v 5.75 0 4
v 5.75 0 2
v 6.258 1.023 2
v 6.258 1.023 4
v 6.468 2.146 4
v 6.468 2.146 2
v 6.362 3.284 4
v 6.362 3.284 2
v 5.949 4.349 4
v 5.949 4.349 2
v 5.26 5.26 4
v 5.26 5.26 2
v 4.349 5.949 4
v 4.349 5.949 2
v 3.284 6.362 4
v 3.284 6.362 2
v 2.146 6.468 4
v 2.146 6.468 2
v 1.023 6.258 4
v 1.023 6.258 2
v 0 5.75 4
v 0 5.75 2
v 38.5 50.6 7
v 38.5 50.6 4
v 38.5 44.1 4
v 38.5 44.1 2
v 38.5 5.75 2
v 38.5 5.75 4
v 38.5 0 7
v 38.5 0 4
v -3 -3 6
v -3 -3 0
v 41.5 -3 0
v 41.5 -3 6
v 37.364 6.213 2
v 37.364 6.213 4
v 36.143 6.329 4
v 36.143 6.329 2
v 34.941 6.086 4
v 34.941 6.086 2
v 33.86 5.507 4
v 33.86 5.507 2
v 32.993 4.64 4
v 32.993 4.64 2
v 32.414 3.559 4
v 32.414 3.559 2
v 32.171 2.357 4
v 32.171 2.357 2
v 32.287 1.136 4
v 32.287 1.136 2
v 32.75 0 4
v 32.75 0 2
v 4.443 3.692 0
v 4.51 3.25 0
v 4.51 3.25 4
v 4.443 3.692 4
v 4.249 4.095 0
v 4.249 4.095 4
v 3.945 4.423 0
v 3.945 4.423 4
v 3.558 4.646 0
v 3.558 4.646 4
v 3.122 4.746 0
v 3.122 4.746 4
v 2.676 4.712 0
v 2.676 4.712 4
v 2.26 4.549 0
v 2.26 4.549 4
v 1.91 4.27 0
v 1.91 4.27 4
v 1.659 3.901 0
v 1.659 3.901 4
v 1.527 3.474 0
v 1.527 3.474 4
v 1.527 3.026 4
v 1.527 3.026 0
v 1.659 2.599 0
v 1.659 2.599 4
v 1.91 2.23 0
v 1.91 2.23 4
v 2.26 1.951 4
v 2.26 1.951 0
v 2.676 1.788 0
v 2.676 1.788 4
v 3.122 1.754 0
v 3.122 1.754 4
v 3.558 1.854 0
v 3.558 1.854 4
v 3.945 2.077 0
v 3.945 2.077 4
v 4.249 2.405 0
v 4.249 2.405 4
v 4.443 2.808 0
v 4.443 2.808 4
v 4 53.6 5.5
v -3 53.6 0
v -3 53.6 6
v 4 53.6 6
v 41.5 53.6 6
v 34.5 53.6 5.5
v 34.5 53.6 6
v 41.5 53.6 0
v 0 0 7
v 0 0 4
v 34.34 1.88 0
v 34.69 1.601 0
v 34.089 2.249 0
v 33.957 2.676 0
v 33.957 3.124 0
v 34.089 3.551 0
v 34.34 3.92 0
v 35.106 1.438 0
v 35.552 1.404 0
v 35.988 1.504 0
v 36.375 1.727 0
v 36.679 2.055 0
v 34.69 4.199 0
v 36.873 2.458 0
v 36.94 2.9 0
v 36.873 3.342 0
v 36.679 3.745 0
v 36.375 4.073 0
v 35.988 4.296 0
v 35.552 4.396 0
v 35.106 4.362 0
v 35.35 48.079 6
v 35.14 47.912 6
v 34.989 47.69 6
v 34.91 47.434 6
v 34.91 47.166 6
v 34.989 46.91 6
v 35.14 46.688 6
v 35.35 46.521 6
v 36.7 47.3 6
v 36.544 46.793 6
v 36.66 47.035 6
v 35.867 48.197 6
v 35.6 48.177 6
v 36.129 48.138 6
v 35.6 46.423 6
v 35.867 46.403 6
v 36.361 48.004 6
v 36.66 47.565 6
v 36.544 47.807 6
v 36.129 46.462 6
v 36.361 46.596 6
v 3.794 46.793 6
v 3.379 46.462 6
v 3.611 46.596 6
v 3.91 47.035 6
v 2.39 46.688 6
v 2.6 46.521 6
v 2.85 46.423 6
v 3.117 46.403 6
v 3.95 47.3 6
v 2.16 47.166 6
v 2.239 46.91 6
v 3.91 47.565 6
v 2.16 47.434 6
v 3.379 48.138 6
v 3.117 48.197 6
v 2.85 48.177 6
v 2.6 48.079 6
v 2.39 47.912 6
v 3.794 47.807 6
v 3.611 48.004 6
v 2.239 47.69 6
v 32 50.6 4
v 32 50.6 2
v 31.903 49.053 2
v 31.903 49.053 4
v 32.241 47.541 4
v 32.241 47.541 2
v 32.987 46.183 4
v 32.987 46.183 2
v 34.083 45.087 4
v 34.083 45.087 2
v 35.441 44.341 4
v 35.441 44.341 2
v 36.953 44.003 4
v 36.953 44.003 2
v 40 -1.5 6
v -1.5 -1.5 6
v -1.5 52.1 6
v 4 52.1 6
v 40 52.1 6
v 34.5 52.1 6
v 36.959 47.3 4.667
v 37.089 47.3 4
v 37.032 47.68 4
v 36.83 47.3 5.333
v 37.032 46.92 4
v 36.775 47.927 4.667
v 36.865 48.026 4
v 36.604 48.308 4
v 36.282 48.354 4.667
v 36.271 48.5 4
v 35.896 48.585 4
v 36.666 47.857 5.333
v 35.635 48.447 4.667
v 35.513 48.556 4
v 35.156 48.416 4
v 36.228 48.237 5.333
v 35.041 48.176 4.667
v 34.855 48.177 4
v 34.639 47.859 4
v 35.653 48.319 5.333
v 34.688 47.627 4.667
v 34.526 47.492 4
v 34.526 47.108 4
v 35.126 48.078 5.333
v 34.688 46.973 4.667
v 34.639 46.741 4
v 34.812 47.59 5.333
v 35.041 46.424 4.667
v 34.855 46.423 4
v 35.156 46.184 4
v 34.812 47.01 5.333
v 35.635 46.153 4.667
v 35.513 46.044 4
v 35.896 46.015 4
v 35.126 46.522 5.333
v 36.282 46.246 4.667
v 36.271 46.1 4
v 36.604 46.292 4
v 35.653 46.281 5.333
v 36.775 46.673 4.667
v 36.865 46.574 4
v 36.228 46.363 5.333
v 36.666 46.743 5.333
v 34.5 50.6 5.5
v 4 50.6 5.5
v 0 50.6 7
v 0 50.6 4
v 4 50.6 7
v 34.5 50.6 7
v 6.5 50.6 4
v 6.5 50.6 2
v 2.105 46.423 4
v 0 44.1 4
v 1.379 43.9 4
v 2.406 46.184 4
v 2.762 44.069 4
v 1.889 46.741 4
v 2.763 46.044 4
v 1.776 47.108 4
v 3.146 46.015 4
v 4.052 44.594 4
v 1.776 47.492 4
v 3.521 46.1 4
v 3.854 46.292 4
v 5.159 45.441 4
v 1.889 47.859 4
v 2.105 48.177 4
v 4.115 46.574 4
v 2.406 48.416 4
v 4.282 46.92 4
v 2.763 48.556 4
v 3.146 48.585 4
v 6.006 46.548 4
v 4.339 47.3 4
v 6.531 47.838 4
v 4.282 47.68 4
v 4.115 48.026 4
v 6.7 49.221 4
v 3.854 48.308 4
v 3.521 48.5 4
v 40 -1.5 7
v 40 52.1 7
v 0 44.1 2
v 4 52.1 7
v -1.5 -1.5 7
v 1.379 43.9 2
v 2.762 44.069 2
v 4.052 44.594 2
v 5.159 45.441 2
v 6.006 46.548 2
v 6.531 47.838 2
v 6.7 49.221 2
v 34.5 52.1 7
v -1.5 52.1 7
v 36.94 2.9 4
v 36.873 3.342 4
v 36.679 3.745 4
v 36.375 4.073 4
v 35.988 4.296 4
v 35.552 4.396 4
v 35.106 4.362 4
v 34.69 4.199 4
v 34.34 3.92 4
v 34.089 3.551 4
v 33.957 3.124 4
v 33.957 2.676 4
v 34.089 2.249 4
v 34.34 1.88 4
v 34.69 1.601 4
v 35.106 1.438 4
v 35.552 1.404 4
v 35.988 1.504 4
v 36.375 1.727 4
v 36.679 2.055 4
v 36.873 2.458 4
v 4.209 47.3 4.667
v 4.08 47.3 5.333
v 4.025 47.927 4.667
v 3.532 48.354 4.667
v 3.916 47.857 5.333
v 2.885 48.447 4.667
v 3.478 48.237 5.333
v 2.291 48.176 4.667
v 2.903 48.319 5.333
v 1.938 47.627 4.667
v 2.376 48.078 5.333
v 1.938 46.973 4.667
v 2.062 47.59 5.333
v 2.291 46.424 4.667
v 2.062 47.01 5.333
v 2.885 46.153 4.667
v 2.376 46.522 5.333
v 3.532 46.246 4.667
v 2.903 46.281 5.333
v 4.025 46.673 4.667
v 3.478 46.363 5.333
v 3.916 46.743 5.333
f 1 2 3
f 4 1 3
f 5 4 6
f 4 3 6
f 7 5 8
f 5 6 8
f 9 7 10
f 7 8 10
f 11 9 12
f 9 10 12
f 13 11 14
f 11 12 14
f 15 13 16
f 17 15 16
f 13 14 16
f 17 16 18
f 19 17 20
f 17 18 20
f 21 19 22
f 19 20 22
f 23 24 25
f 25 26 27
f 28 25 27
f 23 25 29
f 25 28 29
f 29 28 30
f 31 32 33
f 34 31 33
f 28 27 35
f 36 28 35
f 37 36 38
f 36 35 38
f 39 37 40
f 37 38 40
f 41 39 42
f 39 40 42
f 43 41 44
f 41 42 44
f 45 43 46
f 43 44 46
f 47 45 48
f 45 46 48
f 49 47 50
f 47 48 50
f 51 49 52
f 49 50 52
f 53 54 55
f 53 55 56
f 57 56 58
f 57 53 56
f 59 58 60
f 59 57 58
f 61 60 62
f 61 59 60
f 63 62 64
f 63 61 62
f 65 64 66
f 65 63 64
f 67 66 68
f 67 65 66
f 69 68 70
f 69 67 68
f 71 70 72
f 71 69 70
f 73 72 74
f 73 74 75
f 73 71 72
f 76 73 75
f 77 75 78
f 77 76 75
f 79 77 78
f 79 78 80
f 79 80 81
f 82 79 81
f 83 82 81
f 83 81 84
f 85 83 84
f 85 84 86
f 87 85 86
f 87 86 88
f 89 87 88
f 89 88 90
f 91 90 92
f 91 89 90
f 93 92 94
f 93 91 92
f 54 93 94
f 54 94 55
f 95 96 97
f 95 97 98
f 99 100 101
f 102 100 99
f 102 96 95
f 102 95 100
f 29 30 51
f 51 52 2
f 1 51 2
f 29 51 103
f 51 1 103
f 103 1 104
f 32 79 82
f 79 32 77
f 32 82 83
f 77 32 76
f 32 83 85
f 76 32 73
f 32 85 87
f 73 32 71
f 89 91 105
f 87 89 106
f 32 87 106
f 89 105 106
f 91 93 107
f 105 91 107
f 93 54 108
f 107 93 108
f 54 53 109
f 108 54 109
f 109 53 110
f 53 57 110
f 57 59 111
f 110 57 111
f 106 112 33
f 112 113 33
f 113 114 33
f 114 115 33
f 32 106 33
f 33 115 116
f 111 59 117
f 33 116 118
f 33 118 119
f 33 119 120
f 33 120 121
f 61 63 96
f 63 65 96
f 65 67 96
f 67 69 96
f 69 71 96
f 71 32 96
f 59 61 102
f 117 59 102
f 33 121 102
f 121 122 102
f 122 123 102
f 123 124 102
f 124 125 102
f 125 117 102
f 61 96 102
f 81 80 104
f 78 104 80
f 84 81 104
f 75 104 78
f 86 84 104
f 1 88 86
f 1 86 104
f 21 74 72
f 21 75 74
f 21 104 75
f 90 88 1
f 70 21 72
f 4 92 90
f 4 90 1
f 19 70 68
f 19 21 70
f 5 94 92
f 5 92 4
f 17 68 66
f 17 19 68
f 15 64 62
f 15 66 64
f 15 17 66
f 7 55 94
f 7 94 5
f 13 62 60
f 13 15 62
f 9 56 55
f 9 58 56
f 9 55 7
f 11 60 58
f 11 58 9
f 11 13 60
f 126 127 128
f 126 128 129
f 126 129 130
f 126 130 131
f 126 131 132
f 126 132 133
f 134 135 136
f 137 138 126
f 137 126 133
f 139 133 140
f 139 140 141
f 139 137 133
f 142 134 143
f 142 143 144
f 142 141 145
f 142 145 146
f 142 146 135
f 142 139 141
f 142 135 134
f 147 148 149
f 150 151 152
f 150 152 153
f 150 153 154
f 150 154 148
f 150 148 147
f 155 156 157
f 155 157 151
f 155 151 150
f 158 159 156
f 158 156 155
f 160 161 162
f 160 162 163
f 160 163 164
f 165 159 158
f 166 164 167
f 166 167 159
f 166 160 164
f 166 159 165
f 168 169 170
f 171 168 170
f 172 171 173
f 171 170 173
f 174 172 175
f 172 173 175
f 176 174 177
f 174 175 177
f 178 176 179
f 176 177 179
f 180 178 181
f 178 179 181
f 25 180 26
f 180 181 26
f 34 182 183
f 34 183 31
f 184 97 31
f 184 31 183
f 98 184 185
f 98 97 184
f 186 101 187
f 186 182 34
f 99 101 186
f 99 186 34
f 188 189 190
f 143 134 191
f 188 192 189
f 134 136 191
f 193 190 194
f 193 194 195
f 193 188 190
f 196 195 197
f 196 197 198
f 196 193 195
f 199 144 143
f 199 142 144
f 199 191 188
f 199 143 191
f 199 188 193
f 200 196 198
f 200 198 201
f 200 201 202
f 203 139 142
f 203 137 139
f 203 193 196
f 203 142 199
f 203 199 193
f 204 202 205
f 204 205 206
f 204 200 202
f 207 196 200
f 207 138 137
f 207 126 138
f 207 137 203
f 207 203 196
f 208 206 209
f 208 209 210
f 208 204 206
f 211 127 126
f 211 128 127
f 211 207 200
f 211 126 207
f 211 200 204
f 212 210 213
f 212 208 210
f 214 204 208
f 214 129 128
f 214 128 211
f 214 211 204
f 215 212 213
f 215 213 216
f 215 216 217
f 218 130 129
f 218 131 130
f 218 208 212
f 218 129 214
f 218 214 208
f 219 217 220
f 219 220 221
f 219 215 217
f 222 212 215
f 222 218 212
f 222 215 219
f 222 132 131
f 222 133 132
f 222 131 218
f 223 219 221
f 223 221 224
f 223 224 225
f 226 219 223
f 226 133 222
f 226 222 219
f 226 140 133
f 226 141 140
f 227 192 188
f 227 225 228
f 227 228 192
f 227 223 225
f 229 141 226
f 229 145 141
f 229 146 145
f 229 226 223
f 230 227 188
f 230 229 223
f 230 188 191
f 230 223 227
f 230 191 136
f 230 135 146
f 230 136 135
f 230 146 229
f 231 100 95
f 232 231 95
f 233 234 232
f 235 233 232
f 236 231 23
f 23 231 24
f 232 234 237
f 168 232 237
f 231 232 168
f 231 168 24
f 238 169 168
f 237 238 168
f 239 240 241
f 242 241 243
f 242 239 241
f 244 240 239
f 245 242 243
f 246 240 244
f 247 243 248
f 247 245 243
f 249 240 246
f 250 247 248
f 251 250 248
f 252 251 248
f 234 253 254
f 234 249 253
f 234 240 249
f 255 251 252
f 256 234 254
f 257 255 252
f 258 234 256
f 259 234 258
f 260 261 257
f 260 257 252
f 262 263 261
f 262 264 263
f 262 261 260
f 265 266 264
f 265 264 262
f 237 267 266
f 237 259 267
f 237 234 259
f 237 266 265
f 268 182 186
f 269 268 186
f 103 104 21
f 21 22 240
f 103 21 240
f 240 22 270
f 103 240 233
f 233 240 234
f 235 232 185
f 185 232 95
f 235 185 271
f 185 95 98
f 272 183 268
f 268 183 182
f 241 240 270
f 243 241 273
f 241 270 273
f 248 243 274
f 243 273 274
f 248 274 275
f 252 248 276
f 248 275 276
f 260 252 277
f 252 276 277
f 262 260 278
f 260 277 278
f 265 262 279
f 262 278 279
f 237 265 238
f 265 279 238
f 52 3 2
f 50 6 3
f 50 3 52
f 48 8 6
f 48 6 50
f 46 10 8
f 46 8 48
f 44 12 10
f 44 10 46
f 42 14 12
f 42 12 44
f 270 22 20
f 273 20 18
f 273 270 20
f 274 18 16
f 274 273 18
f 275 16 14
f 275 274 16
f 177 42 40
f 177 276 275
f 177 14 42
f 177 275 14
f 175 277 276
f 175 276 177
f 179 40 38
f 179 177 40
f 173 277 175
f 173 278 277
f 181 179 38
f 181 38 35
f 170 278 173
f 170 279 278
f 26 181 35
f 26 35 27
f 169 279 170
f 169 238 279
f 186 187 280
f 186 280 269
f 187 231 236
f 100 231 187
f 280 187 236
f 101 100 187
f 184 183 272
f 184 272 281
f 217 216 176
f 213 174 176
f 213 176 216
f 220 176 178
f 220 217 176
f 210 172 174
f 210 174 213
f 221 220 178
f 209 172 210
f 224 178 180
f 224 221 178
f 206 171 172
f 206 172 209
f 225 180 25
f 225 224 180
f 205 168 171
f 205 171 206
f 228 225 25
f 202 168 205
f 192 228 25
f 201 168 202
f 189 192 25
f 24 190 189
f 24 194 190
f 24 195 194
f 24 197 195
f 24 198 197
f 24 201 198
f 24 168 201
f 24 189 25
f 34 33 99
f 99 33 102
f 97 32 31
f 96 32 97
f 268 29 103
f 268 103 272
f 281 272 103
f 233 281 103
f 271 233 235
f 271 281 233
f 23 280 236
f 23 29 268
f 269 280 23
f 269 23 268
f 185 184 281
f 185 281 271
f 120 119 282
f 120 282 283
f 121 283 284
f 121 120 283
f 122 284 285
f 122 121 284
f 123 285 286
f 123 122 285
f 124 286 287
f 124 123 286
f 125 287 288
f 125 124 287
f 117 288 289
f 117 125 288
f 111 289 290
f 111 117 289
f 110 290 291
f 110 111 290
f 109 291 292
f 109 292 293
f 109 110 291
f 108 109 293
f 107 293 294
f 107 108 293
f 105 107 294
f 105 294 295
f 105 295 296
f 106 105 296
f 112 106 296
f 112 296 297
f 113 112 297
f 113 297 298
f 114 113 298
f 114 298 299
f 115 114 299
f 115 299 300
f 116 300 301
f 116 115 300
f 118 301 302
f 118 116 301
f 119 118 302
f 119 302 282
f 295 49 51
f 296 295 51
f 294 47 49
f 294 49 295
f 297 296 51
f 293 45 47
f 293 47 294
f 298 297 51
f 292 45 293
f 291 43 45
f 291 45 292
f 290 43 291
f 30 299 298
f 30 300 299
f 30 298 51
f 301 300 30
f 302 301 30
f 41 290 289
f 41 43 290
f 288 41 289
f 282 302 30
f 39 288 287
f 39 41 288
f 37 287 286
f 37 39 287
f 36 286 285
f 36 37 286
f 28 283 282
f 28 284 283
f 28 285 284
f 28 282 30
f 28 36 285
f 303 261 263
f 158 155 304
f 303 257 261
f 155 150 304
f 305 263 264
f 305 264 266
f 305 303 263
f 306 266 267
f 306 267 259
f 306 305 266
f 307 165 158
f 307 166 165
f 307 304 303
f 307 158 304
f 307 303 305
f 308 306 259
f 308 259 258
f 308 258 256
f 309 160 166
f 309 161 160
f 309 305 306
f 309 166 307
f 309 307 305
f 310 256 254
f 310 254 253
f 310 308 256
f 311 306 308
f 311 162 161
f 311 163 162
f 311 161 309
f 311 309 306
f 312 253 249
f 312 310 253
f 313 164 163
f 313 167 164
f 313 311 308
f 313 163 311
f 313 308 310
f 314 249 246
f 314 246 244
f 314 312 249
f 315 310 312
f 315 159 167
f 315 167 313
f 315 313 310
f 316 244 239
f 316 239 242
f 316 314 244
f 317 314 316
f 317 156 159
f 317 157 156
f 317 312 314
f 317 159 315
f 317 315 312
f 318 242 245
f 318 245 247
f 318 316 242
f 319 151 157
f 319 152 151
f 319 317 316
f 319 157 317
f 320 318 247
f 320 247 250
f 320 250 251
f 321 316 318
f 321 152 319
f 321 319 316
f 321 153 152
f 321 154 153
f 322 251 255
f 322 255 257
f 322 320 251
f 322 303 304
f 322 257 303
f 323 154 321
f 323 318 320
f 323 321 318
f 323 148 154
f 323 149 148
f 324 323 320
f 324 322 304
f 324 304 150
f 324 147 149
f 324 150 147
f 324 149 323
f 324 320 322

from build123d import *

# Parameters (mm, degrees)
F1_DEPTH = 2
F0_R     = 1.3
F0_R_2   = 1.5
F2_DEPTH = 4
F3_DEPTH = 6
F0_W     = 41.5
F0_H     = 53.6
F4_DEPTH = 7
F0_W_2   = 44.5
F0_H_2   = 56.6
F5_DEPTH = 6
F6_W     = 30.5
F6_H     = 1.5
F7_DEPTH = 3


# Not quite as in the source:
# - a fillet or chamfer that OpenCascade refuses, or shapes differently, is made with other operations: its cross-section is extruded or revolved along the edge and cut away or added
# - a feature names something its author has since deleted; it is built from what else it names


with BuildPart() as f1:
    # F0 (on Top) → F1 (new body)
    with BuildSketch(Plane.XY):
        with BuildLine():
            ThreePointArc((0, 5.75), (5.2603266711, 5.2603266711), (5.75, 0))
            Line((5.75, 0), (32.75, 0))
            ThreePointArc((32.75, 0), (33.3948928082, 5.1051071918), (38.5, 5.75))
            Line((38.5, 5.75), (38.5, 44.1))
            ThreePointArc((38.5, 44.1), (33.4963752154, 45.5963752154), (32, 50.6))
            Line((32, 50.6), (6.5, 50.6))
            ThreePointArc((6.5, 50.6), (5.1593928501, 45.4406071499), (0, 44.1))
            Line((0, 44.1), (0, 5.75))
        make_face()
    extrude(amount=F1_DEPTH)

    # F0 (on Top) → F2 (join)
    with BuildSketch(Plane.XY):
        with BuildLine():
            Line((0, 50.6), (0, 44.1))
            ThreePointArc((0, 44.1), (5.1593928501, 45.4406071499), (6.5, 50.6))
            Line((6.5, 50.6), (0, 50.6))
        make_face()
        with Locations((3.05, 47.3)):
            Circle(F0_R, mode=Mode.SUBTRACT)
        with BuildLine():
            ThreePointArc((32, 50.6), (33.4963752154, 45.5963752154), (38.5, 44.1))
            Line((38.5, 44.1), (38.5, 50.6))
            Line((38.5, 50.6), (32, 50.6))
        make_face()
        with Locations((35.8, 47.3)):
            Circle(F0_R, mode=Mode.SUBTRACT)
        with BuildLine():
            ThreePointArc((38.5, 5.75), (33.3948928082, 5.1051071918), (32.75, 0))
            Line((32.75, 0), (38.5, 0))
            Line((38.5, 0), (38.5, 5.75))
        make_face()
        with Locations((35.44, 2.9)):
            Circle(F0_R_2, mode=Mode.SUBTRACT)
        with BuildLine():
            Line((0, 5.75), (0, 0))
            Line((0, 0), (5.75, 0))
            ThreePointArc((5.75, 0), (5.2603266711, 5.2603266711), (0, 5.75))
        make_face()
        with Locations((3.01, 3.25)):
            Circle(F0_R_2, mode=Mode.SUBTRACT)
    extrude(amount=F2_DEPTH)

    # F0 (on Top) → F3 (join)
    with BuildSketch(Plane.XY):
        with Locations((3.05, 47.3)):
            Circle(F0_R)
        with Locations((35.8, 47.3)):
            Circle(F0_R)
    extrude(amount=F3_DEPTH)

    # F0 (on Top) → F4 (join)
    with BuildSketch(Plane.XY):
        with Locations((19.25, 25.3)):
            Rectangle(F0_W, F0_H)
        Polygon((5.75, 0), (0, 0), (0, 5.75), (0, 44.1), (0, 50.6), (6.5, 50.6), (32, 50.6), (38.5, 50.6), (38.5, 44.1), (38.5, 5.75), (38.5, 0), (32.75, 0), align=None, mode=Mode.SUBTRACT)
    extrude(amount=F4_DEPTH)

    # F0 (on Top) → F5 (join)
    with BuildSketch(Plane.XY):
        with Locations((19.25, 25.3)):
            Rectangle(F0_W_2, F0_H_2)
        with Locations((19.25, 25.3)):
            Rectangle(F0_W, F0_H, mode=Mode.SUBTRACT)
    extrude(amount=F5_DEPTH)

    # F6 (on face) → F7 (cut)
    with BuildSketch(Plane(origin=(0, 53.6, 0), x_dir=(-1, 0, 0), z_dir=(0, 1, 0))):
        with Locations((-19.25, 6.25)):
            Rectangle(F6_W, F6_H)
    extrude(amount=-F7_DEPTH, mode=Mode.SUBTRACT)

    # F8: chamfer of 0.4 x 2.0578216064 on 2 edges, made by hand


with BuildPart() as f8_tool2:
    # F8_s3 → F8_t4 (revolve)
    with BuildSketch(Plane.XZ.offset(-47.3)):
        Polygon((37.1, 3.9421783936), (36.7, 6), (37.1, 6), align=None)
    revolve(axis=Axis((35.8, 47.3, 6), (0, 0, 1)))

    split(bisect_by=Plane.XY.offset(4), keep=Keep.TOP)


with BuildPart() as f1_1:
    add(f1.part)

    # F8_t1: cut F8_tool2
    add(f8_tool2.part, mode=Mode.SUBTRACT)


with BuildPart() as f8_tool7:
    # F8_s8 → F8_t9 (revolve)
    with BuildSketch(Plane.XZ.offset(-47.3)):
        Polygon((4.35, 3.9421783936), (3.95, 6), (4.35, 6), align=None)
    revolve(axis=Axis((3.05, 47.3, 6), (0, 0, 1)))

    split(bisect_by=Plane.XY.offset(4), keep=Keep.TOP)


with BuildPart() as f1_2:
    add(f1_1.part)

    # F8_t6: cut F8_tool7
    add(f8_tool7.part, mode=Mode.SUBTRACT)


solid = f1_2.part
